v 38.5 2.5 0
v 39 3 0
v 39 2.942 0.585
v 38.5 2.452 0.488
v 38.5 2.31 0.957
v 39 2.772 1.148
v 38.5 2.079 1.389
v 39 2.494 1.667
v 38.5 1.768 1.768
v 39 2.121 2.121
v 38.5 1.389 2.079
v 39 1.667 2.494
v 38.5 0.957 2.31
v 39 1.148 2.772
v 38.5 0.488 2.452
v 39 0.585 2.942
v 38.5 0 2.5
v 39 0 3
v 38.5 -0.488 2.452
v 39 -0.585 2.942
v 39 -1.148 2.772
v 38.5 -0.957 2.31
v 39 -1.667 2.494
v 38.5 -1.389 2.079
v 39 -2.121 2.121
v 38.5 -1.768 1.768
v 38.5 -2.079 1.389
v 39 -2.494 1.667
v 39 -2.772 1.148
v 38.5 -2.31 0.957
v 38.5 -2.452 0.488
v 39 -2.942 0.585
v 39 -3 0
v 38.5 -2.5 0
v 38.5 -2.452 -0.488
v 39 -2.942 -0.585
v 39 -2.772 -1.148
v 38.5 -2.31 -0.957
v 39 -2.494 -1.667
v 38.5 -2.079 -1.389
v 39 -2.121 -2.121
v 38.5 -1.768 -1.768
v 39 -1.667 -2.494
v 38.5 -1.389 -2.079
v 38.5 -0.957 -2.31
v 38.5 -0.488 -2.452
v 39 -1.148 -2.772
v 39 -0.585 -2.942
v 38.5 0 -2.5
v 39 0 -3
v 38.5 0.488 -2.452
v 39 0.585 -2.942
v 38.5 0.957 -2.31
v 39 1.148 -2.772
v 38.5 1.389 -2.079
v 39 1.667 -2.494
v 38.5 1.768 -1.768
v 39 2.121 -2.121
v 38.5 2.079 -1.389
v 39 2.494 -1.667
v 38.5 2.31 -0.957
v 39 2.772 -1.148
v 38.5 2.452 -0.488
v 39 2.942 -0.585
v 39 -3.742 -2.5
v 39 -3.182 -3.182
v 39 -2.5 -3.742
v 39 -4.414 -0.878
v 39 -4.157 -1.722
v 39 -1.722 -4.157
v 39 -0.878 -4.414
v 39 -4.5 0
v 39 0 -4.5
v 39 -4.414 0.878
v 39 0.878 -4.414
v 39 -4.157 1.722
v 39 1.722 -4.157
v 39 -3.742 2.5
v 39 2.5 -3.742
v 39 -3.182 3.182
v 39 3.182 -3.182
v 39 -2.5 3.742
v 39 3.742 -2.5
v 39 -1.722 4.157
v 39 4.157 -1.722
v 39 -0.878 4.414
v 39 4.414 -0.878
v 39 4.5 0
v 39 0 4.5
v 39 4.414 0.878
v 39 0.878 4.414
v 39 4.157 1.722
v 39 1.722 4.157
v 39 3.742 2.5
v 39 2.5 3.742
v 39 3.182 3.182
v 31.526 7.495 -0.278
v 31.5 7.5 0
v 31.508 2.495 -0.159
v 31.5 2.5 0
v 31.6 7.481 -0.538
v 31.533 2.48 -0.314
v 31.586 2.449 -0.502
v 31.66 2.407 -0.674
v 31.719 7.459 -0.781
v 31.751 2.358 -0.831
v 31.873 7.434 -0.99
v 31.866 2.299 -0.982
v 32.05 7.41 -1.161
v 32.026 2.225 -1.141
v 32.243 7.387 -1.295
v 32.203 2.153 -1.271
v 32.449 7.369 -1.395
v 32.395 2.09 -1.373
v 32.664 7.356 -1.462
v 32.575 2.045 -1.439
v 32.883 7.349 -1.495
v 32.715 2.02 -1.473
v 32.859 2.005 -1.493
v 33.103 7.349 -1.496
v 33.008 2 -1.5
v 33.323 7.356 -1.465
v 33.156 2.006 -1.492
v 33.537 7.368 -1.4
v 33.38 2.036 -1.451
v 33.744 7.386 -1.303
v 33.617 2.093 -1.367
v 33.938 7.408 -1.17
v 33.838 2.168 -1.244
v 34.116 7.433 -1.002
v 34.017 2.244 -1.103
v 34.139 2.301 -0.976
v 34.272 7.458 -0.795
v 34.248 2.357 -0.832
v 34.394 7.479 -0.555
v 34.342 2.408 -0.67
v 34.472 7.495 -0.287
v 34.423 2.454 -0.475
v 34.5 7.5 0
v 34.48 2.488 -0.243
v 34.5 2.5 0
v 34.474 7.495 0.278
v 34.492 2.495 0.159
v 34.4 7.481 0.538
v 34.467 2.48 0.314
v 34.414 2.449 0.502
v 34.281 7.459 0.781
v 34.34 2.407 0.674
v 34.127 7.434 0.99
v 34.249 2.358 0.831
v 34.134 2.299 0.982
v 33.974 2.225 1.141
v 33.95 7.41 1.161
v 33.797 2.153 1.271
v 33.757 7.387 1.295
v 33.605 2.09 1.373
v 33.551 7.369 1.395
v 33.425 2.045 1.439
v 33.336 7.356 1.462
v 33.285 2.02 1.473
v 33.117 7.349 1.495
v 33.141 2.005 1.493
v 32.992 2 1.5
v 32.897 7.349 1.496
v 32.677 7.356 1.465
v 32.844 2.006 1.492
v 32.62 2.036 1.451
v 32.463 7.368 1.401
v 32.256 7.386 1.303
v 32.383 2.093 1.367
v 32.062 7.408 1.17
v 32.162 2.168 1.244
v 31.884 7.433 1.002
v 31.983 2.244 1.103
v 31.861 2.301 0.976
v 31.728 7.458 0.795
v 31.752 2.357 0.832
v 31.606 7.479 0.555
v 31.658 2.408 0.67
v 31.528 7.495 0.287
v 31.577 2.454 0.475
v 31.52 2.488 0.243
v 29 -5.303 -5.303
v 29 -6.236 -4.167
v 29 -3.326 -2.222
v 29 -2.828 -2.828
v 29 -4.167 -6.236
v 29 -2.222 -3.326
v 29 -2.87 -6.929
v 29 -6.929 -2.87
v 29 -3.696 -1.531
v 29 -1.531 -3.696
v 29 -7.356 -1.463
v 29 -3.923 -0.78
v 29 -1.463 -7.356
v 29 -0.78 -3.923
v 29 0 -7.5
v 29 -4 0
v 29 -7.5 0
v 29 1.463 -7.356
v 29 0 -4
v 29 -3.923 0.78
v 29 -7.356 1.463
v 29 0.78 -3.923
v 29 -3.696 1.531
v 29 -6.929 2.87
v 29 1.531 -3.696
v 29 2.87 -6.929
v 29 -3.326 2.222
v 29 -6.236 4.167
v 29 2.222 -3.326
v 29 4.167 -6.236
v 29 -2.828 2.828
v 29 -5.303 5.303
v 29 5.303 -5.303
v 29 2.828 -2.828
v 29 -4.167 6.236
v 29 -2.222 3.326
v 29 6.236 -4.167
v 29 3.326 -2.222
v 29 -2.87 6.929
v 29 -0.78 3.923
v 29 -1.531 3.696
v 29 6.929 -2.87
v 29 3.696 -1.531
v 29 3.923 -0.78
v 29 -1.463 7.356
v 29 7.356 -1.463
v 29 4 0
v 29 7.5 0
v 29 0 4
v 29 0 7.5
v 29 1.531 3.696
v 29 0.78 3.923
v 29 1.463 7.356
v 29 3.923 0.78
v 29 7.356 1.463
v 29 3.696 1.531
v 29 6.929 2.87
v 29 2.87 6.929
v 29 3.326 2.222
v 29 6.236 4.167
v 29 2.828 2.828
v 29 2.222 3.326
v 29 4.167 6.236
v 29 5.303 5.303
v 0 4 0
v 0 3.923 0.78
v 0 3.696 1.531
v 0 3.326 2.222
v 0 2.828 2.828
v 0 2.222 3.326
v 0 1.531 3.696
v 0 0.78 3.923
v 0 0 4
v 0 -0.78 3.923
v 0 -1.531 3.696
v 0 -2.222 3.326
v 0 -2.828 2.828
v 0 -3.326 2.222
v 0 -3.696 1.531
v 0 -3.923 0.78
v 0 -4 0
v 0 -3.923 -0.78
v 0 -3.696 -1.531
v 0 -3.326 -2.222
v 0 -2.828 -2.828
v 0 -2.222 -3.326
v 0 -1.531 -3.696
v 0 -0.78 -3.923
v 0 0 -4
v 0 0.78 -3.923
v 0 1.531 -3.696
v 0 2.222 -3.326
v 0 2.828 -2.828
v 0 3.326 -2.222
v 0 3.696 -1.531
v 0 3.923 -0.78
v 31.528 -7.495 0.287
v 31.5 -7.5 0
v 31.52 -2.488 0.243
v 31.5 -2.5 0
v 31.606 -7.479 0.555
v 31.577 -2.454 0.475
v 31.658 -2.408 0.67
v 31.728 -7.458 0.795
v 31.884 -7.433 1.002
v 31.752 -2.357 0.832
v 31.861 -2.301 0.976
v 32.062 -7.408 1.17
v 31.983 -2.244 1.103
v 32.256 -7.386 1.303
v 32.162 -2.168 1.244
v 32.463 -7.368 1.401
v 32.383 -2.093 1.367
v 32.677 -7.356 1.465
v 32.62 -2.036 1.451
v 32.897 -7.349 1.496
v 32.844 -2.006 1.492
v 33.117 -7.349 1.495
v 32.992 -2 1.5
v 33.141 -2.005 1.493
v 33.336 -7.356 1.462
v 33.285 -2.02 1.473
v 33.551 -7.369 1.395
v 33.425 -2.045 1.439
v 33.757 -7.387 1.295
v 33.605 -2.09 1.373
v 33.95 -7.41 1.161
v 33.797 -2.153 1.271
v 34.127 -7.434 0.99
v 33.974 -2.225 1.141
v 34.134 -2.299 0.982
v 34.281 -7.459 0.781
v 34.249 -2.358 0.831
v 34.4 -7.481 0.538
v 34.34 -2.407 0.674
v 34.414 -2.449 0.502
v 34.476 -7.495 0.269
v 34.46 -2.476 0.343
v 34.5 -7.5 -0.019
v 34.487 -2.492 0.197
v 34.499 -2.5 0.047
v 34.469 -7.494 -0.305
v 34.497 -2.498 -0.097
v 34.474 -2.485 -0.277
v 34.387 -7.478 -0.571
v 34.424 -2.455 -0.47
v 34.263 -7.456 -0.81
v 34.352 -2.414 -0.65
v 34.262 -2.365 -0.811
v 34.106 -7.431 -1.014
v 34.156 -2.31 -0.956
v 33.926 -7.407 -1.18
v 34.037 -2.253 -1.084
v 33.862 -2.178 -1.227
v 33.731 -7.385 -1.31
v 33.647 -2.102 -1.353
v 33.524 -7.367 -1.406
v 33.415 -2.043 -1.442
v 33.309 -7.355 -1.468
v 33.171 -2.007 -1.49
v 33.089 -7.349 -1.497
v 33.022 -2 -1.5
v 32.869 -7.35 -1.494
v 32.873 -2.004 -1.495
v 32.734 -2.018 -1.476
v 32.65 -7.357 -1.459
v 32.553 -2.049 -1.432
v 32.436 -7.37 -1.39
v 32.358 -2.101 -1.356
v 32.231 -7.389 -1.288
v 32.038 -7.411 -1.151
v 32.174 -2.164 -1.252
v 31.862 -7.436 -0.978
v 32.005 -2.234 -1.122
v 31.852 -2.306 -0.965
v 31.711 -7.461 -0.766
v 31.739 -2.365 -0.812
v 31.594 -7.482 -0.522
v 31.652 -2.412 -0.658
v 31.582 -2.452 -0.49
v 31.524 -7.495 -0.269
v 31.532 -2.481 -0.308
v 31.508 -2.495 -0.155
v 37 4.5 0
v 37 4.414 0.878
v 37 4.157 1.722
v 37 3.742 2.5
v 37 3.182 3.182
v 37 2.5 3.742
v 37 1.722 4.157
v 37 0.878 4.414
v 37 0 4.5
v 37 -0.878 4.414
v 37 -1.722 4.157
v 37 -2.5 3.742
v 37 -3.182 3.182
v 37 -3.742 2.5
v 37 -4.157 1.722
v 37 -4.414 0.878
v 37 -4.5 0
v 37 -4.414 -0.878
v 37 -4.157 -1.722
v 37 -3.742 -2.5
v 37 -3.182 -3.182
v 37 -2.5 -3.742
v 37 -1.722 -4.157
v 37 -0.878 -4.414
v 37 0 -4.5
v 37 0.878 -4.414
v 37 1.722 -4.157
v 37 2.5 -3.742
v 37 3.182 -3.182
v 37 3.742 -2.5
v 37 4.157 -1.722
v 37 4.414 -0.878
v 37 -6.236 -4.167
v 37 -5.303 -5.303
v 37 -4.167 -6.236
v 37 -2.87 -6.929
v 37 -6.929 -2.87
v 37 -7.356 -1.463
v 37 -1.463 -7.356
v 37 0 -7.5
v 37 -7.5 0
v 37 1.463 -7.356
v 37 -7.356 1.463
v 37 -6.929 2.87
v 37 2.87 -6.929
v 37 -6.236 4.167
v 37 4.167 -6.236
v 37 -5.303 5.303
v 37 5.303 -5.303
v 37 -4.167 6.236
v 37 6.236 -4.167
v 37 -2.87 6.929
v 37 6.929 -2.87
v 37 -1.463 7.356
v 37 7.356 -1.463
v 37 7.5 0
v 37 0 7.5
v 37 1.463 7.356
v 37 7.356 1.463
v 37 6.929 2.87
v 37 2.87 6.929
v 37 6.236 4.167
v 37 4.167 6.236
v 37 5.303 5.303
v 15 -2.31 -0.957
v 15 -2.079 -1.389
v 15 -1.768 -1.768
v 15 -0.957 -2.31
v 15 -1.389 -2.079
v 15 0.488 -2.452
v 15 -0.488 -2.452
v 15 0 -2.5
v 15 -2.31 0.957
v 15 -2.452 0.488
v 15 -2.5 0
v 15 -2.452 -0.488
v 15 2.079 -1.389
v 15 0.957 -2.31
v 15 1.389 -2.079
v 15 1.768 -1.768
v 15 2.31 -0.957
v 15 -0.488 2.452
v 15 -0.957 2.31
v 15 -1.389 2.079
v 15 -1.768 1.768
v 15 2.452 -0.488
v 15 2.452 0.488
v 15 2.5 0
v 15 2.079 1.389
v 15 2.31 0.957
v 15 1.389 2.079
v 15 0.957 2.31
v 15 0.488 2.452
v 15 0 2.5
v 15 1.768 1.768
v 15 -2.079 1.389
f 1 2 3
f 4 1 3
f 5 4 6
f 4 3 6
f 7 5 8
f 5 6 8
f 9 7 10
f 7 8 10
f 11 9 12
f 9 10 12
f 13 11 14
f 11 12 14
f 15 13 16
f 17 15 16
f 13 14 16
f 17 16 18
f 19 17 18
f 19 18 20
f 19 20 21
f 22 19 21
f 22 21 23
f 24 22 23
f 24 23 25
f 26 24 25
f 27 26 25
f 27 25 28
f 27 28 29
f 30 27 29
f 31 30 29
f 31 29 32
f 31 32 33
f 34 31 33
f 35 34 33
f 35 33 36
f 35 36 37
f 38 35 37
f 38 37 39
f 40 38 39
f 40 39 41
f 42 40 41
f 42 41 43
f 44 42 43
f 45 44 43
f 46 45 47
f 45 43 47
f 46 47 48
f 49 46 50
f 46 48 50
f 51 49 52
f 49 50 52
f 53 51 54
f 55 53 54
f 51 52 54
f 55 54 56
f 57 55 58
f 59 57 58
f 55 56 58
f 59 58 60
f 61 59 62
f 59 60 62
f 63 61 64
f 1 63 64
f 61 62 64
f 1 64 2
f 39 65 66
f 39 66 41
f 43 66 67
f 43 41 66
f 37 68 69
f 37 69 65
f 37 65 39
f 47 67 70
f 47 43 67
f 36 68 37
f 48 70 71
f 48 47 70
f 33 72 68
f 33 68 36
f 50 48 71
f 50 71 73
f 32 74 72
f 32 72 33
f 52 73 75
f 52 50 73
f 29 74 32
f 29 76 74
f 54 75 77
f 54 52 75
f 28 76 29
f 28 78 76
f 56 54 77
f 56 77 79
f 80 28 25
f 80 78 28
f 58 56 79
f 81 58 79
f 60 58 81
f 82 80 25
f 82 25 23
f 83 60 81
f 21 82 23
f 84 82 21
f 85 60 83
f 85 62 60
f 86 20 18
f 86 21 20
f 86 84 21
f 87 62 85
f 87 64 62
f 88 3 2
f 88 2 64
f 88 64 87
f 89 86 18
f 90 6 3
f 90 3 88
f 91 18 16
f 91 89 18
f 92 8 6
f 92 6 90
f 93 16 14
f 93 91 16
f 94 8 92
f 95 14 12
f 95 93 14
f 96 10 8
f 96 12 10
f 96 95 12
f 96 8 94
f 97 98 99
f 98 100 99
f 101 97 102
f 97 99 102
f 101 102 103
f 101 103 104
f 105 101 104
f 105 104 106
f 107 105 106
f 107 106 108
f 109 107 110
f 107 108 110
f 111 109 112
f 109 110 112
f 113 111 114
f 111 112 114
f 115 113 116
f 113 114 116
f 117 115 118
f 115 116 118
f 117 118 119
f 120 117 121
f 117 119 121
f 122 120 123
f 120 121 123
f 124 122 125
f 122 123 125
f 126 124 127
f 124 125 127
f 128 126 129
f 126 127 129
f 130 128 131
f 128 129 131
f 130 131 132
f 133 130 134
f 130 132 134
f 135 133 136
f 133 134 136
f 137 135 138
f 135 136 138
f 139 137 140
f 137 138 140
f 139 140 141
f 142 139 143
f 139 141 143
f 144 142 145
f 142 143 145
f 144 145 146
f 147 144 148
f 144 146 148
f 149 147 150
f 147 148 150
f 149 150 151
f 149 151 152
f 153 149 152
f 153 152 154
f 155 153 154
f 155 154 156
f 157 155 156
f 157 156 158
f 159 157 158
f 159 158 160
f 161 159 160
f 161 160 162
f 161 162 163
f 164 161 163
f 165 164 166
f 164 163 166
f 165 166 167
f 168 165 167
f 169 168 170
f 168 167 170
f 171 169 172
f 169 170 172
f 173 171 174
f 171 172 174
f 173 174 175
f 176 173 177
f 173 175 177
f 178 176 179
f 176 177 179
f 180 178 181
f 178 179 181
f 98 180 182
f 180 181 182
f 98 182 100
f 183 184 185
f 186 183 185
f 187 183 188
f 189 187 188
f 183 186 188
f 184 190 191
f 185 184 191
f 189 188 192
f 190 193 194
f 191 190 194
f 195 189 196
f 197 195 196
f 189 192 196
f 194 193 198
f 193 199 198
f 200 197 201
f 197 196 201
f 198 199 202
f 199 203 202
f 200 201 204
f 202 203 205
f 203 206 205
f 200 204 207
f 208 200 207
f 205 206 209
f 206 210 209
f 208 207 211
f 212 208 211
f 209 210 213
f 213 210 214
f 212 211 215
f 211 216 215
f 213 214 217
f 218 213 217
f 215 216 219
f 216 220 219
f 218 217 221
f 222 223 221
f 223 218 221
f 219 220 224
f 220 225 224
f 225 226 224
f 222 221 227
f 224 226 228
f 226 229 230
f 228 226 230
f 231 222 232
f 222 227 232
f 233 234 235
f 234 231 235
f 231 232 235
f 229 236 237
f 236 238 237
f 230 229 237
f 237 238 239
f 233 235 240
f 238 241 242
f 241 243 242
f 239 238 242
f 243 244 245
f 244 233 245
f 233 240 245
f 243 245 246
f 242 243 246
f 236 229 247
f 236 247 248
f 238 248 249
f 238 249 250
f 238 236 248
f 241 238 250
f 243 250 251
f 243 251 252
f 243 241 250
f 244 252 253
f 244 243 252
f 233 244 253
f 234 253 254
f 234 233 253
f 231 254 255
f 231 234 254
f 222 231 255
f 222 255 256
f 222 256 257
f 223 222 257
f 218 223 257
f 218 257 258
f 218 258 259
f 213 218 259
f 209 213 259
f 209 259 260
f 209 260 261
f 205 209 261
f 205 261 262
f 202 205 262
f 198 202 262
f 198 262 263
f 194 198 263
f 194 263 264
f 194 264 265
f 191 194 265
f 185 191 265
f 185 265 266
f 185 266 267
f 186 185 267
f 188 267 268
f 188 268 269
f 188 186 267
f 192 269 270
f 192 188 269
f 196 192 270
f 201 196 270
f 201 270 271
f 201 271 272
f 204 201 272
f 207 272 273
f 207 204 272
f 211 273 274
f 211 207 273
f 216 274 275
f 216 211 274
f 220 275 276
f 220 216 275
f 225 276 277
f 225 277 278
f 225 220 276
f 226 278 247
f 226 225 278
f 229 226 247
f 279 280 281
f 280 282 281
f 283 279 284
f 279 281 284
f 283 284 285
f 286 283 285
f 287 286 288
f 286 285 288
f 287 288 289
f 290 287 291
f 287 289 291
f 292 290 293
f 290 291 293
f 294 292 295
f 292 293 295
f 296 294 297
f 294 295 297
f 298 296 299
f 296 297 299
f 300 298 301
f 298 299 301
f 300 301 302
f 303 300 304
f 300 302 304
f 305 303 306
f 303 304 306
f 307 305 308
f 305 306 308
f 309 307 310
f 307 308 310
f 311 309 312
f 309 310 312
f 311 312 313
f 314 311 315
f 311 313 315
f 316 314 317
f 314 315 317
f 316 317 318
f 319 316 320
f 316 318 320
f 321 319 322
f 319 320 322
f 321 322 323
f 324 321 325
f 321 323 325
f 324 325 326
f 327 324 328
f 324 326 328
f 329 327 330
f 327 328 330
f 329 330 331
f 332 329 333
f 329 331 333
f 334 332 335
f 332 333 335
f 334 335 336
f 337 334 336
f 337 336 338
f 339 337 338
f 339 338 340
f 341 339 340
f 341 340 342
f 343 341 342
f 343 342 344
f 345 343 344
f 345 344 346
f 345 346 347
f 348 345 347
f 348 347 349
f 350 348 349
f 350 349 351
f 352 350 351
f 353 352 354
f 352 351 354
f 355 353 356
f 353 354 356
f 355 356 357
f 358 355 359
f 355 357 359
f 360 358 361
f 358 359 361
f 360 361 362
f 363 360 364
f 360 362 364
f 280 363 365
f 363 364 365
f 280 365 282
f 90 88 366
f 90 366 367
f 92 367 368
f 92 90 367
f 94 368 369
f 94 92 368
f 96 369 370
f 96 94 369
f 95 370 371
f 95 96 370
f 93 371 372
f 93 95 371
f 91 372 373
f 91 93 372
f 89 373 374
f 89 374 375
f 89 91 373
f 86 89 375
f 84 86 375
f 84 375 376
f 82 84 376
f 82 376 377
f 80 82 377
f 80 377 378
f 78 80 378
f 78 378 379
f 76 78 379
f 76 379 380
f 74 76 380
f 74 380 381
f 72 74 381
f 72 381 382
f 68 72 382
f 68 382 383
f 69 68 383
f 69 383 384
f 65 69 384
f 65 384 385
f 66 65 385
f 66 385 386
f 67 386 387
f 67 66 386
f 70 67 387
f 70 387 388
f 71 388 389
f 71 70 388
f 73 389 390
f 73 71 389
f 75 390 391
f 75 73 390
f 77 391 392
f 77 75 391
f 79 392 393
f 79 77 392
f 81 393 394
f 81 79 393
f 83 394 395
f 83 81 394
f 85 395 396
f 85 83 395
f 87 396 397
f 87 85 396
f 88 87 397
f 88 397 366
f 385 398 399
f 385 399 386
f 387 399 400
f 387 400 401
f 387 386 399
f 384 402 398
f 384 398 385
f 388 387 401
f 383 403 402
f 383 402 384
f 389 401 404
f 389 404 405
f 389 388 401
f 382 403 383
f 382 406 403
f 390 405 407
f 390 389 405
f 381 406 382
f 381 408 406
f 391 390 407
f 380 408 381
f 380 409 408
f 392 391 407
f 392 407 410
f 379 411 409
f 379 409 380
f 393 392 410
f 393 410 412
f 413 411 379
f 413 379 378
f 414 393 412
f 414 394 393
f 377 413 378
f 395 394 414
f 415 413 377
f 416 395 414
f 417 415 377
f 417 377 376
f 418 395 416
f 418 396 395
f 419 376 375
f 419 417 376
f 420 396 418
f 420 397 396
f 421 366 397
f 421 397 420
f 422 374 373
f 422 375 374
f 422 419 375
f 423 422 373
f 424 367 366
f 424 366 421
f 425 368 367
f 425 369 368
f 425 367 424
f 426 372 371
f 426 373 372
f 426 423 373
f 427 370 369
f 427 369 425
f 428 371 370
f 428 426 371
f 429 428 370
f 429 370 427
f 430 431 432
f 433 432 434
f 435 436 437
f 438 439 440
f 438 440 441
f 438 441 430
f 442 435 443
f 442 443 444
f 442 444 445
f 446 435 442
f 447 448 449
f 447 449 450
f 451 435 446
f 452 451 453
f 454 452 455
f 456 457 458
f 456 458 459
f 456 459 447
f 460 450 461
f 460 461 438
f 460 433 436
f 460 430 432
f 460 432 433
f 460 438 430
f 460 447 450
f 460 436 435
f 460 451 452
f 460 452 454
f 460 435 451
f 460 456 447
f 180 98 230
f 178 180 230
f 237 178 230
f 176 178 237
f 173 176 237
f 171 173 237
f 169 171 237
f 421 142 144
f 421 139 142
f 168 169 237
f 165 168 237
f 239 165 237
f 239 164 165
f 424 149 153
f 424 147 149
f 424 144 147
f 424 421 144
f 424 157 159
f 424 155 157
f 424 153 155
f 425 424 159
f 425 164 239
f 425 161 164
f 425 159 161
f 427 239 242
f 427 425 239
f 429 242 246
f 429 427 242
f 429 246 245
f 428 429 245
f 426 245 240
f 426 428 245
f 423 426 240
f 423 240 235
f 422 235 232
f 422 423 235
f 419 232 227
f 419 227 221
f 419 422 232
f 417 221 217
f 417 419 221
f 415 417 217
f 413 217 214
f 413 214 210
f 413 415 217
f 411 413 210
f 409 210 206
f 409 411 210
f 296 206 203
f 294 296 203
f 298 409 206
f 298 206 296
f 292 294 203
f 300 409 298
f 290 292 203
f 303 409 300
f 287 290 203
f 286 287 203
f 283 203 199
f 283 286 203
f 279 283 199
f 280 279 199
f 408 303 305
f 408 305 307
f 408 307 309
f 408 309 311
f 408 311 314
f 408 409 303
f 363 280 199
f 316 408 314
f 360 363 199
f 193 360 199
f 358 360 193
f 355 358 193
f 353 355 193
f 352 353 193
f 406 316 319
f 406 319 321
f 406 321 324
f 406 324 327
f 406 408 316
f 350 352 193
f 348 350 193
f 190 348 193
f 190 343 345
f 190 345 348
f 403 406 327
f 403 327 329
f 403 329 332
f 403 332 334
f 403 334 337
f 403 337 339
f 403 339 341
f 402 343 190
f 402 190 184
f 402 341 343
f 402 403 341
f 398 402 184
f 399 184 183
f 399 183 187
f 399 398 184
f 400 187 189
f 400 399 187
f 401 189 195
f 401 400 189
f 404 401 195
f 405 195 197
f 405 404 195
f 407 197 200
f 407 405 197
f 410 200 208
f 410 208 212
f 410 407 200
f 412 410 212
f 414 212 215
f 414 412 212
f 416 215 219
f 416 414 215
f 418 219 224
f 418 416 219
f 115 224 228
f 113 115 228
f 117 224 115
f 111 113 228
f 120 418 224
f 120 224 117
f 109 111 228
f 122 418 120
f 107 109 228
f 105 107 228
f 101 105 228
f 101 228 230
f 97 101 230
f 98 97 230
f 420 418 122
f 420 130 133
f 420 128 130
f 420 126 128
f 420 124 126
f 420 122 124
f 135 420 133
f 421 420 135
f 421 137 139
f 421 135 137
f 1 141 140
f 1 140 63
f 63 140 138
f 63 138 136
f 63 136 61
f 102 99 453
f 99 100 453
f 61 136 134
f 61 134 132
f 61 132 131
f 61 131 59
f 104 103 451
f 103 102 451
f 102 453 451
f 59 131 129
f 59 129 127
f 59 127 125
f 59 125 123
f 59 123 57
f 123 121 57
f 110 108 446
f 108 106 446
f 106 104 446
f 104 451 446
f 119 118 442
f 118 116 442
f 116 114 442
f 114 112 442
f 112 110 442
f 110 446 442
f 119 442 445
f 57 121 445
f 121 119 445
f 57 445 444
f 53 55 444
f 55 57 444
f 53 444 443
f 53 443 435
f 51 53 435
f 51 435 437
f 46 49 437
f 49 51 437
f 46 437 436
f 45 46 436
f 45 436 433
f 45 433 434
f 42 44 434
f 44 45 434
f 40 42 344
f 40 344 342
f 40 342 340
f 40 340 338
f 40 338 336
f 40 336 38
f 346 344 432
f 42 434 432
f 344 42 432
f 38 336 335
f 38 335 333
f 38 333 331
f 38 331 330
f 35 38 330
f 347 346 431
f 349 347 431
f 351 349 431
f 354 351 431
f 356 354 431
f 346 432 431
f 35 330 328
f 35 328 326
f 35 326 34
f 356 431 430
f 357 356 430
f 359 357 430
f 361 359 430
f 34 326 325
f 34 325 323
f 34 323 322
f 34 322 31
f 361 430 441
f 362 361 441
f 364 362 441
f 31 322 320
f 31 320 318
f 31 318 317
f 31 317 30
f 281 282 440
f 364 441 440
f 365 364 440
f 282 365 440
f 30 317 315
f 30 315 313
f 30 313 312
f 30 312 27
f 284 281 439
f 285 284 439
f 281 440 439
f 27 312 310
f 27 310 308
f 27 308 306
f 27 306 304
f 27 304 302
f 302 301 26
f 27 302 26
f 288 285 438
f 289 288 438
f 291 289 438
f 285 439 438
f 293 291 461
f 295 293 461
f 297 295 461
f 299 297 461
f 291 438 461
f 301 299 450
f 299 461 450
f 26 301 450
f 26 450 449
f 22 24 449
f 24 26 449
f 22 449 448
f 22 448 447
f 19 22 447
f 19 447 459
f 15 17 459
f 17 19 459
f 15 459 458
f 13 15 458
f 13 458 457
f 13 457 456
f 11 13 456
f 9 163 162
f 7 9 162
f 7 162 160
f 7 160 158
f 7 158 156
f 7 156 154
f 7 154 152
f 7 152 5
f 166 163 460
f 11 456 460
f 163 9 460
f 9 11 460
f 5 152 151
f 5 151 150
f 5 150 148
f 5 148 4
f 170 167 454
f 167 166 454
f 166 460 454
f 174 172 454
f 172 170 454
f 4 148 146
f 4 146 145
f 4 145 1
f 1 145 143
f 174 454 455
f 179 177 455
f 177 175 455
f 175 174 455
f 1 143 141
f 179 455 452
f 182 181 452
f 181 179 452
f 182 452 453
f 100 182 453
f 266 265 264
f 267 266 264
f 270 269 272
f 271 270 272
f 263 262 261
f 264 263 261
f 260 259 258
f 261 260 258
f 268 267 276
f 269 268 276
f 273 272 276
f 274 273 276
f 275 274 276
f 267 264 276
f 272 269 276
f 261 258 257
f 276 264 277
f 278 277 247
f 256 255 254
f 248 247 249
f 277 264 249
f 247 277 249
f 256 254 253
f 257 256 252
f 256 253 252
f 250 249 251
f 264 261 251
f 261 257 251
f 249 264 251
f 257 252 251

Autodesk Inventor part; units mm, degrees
ref_plane "YZ Plane" through (0, 0, 0) normal (1, 0, 0) x (0, 1, 0)
ref_plane "XZ Plane" through (0, 0, 0) normal (0, 1, 0) x (-1, 0, 0)
ref_plane "XY Plane" through (0, 0, 0) normal (0, 0, 1) x (1, 0, 0)
sketch "Sketch1" plane through (0, 0, 0) normal (0, 0, 1) x (1, 0, 0)
  line L0 (0, 0) -> (0, 4)
  line L1 (0, 4) -> (29, 4)
  line L2 (29, 4) -> (29, 7.5)
  line L3 (29, 7.5) -> (37, 7.5)
  line L4 (37, 7.5) -> (37, 4.5)
  line L5 (37, 4.5) -> (39, 4.5)
  line L6 (39, 4.5) -> (39, 2.5)
  line L7 (39, 2.5) -> (15, 2.5)
  line L8 (15, 2.5) -> (15, 0)
  line L9 (15, 0) -> (0, 0)
  line L10 (0, 0) -> (32.1678, 0)
  dimension "d0" = 8
  dimension "d1" = 39
  dimension "d2" = 15
  dimension "d3" = 8
  dimension "d4" = 2
  dimension "d5" = 9
  dimension "d6" = 5
  dimension "d7" = 15
revolve "Revolution1" add sketch "Sketch1" angle 360 about axis through (0, 0, 0) along (1, 0, 0)
chamfer "Chamfer1" distance 0.5 angle 45 1 edges at (39, -2.5, 0)
sketch "Sketch2" plane through (0, 0, 0) normal (0, 1, 0) x (-1, 0, 0)
  circle A0 centre (-33, 0) radius 1.5
  line L0 (0, -4) -> (-29, -4) projected
  line L1 (-29, -4) -> (-29, -7.5) projected
  line L2 (-29, -7.5) -> (-37, -7.5) projected
  line L3 (-37, -7.5) -> (-37, -4.5) projected
  line L4 (-37, -4.5) -> (-39, -4.5) projected
  line L5 (-39, -4.5) -> (-39, -3) projected
  line L6 (-39, -3) -> (-38.5, -2.5) projected
  line L7 (-38.5, -2.5) -> (-15, -2.5) projected
  line L8 (-15, -2.5) -> (-15, 2.5) projected
  line L9 (-15, 2.5) -> (-38.5, 2.5) projected
  line L10 (-38.5, 2.5) -> (-39, 3) projected
  line L11 (-39, 3) -> (-39, 4.5) projected
  line L12 (-39, 4.5) -> (-37, 4.5) projected
  line L13 (-37, 4.5) -> (-37, 7.5) projected
  line L14 (-37, 7.5) -> (-29, 7.5) projected
  line L15 (-29, 7.5) -> (-29, 4) projected
  line L16 (-29, 4) -> (0, 4) projected
  line L17 (0, 4) -> (0, -4) projected
  line L18 (-37, 7.5) -> (-37, -7.5) projected
  line L19 (-29, 7.5) -> (-29, -7.5) projected
  line L20 (-29, 4) -> (-29, -4) projected
  line L21 (0, 4) -> (0, -4) projected
  line L22 (-38.5, -2.5) -> (-38.5, 2.5) projected
  line L23 (0, -4) -> (-29, -4) projected
  point P0 (0, 0)
  point P1 (-15, 0)
  point P2 (-33, 7.5)
  dimension "d12" = 3
extrude "Extrusion1" cut sketch "Sketch2" along normal through all both and the other way through all contours A0
properties part number "Hjulstopp"
